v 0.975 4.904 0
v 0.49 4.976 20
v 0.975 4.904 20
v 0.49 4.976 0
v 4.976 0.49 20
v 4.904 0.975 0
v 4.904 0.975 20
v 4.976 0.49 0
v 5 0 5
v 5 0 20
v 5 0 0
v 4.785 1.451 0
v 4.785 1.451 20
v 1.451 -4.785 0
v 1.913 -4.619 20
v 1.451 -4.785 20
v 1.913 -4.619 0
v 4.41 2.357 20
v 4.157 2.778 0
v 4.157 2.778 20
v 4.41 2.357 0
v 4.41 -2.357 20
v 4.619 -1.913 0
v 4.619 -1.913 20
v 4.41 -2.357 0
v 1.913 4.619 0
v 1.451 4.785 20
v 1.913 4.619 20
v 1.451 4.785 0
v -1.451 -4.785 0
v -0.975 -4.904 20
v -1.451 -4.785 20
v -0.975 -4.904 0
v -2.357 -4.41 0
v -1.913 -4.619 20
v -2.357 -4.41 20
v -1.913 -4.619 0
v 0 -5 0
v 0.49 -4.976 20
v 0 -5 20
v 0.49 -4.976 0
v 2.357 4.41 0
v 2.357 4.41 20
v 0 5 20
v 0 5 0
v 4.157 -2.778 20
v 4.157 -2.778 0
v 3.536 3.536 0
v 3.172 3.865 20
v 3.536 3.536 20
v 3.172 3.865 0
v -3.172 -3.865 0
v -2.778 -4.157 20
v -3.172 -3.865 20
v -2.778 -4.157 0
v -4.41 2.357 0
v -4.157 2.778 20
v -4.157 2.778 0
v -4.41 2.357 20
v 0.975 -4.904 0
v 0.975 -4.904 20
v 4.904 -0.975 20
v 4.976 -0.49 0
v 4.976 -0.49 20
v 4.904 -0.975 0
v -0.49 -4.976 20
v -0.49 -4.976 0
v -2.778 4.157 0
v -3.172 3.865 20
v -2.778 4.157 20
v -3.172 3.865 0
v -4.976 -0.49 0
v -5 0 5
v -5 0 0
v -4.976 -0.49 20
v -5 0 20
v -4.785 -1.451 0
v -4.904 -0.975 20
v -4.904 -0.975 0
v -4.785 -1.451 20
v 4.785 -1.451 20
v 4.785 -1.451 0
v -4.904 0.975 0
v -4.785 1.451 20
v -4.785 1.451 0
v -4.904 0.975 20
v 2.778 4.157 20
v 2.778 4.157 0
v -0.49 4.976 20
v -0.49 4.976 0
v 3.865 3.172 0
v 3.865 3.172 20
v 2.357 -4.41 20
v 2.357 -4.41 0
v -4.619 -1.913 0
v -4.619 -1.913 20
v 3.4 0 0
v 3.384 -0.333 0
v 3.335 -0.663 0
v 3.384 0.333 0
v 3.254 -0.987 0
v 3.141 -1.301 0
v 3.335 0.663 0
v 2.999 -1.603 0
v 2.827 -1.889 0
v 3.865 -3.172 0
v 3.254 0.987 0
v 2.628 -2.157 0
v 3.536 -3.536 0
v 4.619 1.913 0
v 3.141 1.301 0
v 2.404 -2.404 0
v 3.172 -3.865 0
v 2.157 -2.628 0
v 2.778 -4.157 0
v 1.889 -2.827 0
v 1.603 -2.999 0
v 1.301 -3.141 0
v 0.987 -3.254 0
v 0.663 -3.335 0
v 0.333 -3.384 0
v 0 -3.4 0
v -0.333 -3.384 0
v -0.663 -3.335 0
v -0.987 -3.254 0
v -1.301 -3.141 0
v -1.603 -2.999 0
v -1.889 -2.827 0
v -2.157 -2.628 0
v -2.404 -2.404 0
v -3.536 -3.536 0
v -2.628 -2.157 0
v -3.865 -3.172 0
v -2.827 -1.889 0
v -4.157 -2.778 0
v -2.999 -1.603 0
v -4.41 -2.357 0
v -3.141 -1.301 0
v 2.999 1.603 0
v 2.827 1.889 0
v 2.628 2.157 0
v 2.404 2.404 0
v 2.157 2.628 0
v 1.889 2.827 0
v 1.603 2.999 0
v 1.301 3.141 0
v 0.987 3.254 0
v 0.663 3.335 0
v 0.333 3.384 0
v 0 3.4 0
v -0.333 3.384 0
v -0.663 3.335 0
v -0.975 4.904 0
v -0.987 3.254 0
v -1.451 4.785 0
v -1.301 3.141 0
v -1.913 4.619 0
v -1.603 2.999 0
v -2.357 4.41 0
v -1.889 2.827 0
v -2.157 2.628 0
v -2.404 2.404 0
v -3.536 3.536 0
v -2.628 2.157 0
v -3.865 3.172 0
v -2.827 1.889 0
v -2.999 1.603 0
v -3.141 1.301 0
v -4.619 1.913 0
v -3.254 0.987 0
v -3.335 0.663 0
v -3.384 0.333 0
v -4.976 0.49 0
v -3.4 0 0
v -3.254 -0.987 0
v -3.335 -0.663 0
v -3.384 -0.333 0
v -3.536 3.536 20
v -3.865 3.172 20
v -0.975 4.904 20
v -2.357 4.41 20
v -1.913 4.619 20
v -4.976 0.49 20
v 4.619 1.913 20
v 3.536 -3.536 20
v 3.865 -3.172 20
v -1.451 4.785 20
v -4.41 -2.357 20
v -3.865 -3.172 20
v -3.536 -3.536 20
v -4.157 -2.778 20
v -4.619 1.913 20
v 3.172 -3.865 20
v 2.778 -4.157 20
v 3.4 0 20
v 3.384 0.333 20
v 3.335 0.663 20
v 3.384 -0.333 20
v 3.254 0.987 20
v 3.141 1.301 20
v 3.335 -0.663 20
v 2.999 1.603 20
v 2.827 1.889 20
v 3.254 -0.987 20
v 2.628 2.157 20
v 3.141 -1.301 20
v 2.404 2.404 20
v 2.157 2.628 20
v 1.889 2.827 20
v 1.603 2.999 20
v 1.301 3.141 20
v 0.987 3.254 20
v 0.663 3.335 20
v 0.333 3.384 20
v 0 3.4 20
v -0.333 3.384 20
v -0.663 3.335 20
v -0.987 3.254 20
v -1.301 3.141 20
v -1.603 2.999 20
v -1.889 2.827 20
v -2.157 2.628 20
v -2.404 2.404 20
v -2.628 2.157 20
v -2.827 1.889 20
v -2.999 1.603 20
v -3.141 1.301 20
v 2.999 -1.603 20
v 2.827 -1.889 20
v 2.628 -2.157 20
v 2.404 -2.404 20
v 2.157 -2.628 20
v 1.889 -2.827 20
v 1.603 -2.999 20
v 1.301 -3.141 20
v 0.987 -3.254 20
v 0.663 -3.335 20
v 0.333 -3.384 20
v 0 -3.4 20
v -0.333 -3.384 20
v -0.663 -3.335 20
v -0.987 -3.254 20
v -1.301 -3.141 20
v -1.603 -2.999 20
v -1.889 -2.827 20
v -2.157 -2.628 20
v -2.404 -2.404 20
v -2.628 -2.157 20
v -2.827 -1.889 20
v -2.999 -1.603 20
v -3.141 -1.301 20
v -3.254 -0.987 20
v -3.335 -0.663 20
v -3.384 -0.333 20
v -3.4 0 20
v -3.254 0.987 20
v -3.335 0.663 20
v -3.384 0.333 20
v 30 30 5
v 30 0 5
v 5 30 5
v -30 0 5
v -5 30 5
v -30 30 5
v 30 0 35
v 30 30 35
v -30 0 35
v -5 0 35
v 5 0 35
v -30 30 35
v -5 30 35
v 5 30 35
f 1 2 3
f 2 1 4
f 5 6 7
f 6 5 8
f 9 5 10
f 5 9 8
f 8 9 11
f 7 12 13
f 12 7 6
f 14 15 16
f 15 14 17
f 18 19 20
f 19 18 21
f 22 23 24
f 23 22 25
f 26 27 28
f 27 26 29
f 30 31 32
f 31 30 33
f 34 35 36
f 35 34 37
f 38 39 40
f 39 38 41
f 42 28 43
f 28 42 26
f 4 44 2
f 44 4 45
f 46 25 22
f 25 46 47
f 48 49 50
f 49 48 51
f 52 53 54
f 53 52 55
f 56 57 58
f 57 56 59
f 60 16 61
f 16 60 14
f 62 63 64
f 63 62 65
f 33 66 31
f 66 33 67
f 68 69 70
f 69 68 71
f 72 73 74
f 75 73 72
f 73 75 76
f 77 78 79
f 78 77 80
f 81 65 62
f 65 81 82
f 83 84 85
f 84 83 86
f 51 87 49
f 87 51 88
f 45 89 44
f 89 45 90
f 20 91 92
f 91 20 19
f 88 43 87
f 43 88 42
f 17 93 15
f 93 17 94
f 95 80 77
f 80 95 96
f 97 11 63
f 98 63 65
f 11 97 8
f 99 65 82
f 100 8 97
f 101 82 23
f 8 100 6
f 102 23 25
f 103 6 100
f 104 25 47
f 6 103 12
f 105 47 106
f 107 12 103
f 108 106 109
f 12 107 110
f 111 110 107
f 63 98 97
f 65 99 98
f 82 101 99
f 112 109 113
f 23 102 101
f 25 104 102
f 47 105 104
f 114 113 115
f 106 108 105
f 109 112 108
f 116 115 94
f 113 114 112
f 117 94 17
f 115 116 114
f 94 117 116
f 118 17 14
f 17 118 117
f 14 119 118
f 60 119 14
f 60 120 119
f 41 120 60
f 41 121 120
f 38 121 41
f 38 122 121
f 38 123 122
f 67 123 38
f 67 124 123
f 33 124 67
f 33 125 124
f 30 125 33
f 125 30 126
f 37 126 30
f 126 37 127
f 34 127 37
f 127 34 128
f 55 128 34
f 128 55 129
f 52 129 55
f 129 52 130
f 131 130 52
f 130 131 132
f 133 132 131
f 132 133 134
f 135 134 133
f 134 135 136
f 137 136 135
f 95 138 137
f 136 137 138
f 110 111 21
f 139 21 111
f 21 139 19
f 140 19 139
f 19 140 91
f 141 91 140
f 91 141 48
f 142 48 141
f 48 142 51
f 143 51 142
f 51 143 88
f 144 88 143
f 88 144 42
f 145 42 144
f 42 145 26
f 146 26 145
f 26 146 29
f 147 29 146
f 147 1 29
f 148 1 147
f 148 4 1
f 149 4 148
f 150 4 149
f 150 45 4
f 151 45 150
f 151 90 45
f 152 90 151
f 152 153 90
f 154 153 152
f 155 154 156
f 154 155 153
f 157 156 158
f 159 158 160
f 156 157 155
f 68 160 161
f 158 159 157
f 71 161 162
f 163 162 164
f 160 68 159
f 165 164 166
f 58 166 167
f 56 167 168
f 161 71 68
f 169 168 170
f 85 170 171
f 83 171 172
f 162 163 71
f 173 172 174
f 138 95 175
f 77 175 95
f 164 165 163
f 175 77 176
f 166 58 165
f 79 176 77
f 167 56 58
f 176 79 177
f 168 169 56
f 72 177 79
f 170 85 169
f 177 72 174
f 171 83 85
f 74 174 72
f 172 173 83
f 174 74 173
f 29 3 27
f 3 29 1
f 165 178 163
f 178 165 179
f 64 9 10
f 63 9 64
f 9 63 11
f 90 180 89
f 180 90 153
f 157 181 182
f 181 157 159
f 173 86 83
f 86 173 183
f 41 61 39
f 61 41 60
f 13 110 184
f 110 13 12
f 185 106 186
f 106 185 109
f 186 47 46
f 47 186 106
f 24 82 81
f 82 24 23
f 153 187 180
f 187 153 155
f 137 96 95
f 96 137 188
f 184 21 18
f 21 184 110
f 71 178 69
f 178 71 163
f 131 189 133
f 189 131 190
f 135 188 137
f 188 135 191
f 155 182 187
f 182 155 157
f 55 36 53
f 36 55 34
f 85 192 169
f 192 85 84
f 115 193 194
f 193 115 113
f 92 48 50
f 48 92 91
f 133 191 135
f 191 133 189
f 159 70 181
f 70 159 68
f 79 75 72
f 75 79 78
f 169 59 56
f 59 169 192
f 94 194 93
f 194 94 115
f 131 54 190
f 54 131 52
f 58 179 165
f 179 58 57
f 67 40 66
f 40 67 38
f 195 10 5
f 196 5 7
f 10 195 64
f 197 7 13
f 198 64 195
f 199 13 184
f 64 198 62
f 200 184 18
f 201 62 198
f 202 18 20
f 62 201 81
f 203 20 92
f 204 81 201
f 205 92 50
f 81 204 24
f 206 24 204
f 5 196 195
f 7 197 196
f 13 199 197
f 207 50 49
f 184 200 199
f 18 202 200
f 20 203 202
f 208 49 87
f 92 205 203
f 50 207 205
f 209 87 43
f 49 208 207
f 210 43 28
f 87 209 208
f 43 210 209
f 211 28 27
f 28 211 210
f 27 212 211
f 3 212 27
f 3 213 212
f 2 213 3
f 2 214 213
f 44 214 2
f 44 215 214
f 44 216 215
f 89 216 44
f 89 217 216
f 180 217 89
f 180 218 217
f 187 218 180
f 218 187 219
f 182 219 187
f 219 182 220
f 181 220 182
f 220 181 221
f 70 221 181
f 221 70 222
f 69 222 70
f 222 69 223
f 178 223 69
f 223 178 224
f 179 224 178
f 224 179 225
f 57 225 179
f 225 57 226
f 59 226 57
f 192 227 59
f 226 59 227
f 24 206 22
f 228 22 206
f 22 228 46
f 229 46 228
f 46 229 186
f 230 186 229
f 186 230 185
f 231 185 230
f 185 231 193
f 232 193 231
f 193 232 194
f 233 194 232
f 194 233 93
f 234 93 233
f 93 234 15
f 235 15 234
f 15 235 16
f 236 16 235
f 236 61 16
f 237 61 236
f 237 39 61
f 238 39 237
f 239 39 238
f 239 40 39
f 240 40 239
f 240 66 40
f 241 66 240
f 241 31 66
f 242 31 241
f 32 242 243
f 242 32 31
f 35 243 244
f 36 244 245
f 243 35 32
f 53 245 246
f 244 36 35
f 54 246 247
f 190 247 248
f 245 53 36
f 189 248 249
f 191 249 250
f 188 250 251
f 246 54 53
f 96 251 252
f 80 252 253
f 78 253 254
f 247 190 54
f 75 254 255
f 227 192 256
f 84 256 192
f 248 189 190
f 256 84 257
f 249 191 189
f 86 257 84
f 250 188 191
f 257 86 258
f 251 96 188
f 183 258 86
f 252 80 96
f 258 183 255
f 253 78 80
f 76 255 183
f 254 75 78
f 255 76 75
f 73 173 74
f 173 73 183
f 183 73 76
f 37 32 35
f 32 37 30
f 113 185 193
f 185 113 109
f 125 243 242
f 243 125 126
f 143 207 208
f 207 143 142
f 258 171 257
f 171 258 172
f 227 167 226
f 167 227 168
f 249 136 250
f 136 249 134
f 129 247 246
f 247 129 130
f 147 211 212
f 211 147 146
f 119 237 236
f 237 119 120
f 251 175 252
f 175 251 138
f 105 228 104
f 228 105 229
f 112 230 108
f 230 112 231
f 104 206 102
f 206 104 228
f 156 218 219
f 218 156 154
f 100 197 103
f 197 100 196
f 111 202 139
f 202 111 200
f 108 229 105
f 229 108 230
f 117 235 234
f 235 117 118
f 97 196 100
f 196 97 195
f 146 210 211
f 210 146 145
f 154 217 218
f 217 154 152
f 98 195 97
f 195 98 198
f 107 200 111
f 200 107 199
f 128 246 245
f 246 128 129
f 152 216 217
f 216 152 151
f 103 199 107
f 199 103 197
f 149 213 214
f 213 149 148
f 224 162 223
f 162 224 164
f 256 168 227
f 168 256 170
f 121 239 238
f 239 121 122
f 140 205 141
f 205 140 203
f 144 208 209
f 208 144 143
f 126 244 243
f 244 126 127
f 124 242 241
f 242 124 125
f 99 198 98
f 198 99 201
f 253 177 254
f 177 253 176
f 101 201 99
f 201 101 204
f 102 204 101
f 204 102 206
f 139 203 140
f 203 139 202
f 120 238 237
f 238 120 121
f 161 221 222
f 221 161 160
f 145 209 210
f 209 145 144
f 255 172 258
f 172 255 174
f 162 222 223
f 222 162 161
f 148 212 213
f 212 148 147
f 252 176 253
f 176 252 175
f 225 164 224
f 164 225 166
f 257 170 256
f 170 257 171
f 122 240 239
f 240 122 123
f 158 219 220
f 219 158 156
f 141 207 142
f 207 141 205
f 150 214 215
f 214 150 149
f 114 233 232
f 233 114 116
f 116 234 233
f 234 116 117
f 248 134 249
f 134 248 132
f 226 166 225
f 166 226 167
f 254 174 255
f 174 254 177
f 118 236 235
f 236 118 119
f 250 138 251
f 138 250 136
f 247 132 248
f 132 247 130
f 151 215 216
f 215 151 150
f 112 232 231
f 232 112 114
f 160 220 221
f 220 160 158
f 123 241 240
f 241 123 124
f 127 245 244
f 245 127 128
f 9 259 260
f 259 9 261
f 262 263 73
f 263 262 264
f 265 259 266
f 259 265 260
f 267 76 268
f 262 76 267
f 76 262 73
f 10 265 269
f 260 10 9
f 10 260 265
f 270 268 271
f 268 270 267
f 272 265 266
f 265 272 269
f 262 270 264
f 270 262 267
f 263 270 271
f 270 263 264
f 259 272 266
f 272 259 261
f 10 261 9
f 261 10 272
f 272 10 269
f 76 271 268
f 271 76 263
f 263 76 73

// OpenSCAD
// Lab Funnel Design
// Units: millimetres
// Orientation: Upright, wide opening at top, rests on XY plane at z=0.

// --- Dimensions ---
// Spout (Tube)
$spout_outer_diameter = 10;
$spout_inner_diameter = 6.8; // 10 - 2*1.6
$spout_length = 20;

// Cone (Funnel)
$cone_bottom_diameter = 10; // Matches spout outer diameter
$cone_top_diameter = 60;
$cone_height = 30; // From z=20 to z=50

// Wall Thickness
$wall_thickness = 1.6;

// Resolution for curved surfaces
$fn = 64;

// --- Helper Functions ---
// Creates a hollow cylinder (tube)
module hollow_cylinder(outer_d, inner_d, h) {
    difference() {
        cylinder(h = h, d = outer_d, $fn = $fn);
        cylinder(h = h, d = inner_d, $fn = $fn);
    }
}

// Creates a hollow cone (frustum)
// bottom_d: diameter at the smaller end (z=0 relative to cone)
// top_d: diameter at the larger end (z=height relative to cone)
module hollow_cone(bottom_d, top_d, h) {
    difference() {
        // Outer Cone
        linear_extrude(height = h, center = true, convexity = 3) {
            polygon(points = [
                [-top_d/2, 0], [top_d/2, 0], [top_d/2, h], [-top_d/2, h]
            ]);
        }
        
        // Inner Cone (Hole)
        linear_extrude(height = h, center = true, convexity = 3) {
            polygon(points = [
                [-bottom_d/2, 0], [bottom_d/2, 0], [bottom_d/2, h], [-bottom_d/2, h]
            ]);
        }
    }
}

// --- Main Assembly ---
// The funnel rests on the XY plane at z=0.
// The spout runs from z=0 to z=20.
// The cone runs from z=20 to z=50.

translate([0, 0, 0]) {
    // 1. Build the Spout (Tube)
    // Outer diameter 10mm, Inner 6.8mm, Height 20mm
    hollow_cylinder(
        outer_d = $spout_outer_diameter,
        inner_d = $spout_inner_diameter,
        h = $spout_length
    );

    // 2. Build the Cone (Funnel)
    // Positioned starting at z = $spout_length
    // Bottom diameter (at z=20) = 10mm
    // Top diameter (at z=50) = 60mm
    translate([0, 0, $spout_length]) {
        hollow_cone(
            bottom_d = $cone_bottom_diameter,
            top_d = $cone_top_diameter,
            h = $cone_height
        );
    }
}
